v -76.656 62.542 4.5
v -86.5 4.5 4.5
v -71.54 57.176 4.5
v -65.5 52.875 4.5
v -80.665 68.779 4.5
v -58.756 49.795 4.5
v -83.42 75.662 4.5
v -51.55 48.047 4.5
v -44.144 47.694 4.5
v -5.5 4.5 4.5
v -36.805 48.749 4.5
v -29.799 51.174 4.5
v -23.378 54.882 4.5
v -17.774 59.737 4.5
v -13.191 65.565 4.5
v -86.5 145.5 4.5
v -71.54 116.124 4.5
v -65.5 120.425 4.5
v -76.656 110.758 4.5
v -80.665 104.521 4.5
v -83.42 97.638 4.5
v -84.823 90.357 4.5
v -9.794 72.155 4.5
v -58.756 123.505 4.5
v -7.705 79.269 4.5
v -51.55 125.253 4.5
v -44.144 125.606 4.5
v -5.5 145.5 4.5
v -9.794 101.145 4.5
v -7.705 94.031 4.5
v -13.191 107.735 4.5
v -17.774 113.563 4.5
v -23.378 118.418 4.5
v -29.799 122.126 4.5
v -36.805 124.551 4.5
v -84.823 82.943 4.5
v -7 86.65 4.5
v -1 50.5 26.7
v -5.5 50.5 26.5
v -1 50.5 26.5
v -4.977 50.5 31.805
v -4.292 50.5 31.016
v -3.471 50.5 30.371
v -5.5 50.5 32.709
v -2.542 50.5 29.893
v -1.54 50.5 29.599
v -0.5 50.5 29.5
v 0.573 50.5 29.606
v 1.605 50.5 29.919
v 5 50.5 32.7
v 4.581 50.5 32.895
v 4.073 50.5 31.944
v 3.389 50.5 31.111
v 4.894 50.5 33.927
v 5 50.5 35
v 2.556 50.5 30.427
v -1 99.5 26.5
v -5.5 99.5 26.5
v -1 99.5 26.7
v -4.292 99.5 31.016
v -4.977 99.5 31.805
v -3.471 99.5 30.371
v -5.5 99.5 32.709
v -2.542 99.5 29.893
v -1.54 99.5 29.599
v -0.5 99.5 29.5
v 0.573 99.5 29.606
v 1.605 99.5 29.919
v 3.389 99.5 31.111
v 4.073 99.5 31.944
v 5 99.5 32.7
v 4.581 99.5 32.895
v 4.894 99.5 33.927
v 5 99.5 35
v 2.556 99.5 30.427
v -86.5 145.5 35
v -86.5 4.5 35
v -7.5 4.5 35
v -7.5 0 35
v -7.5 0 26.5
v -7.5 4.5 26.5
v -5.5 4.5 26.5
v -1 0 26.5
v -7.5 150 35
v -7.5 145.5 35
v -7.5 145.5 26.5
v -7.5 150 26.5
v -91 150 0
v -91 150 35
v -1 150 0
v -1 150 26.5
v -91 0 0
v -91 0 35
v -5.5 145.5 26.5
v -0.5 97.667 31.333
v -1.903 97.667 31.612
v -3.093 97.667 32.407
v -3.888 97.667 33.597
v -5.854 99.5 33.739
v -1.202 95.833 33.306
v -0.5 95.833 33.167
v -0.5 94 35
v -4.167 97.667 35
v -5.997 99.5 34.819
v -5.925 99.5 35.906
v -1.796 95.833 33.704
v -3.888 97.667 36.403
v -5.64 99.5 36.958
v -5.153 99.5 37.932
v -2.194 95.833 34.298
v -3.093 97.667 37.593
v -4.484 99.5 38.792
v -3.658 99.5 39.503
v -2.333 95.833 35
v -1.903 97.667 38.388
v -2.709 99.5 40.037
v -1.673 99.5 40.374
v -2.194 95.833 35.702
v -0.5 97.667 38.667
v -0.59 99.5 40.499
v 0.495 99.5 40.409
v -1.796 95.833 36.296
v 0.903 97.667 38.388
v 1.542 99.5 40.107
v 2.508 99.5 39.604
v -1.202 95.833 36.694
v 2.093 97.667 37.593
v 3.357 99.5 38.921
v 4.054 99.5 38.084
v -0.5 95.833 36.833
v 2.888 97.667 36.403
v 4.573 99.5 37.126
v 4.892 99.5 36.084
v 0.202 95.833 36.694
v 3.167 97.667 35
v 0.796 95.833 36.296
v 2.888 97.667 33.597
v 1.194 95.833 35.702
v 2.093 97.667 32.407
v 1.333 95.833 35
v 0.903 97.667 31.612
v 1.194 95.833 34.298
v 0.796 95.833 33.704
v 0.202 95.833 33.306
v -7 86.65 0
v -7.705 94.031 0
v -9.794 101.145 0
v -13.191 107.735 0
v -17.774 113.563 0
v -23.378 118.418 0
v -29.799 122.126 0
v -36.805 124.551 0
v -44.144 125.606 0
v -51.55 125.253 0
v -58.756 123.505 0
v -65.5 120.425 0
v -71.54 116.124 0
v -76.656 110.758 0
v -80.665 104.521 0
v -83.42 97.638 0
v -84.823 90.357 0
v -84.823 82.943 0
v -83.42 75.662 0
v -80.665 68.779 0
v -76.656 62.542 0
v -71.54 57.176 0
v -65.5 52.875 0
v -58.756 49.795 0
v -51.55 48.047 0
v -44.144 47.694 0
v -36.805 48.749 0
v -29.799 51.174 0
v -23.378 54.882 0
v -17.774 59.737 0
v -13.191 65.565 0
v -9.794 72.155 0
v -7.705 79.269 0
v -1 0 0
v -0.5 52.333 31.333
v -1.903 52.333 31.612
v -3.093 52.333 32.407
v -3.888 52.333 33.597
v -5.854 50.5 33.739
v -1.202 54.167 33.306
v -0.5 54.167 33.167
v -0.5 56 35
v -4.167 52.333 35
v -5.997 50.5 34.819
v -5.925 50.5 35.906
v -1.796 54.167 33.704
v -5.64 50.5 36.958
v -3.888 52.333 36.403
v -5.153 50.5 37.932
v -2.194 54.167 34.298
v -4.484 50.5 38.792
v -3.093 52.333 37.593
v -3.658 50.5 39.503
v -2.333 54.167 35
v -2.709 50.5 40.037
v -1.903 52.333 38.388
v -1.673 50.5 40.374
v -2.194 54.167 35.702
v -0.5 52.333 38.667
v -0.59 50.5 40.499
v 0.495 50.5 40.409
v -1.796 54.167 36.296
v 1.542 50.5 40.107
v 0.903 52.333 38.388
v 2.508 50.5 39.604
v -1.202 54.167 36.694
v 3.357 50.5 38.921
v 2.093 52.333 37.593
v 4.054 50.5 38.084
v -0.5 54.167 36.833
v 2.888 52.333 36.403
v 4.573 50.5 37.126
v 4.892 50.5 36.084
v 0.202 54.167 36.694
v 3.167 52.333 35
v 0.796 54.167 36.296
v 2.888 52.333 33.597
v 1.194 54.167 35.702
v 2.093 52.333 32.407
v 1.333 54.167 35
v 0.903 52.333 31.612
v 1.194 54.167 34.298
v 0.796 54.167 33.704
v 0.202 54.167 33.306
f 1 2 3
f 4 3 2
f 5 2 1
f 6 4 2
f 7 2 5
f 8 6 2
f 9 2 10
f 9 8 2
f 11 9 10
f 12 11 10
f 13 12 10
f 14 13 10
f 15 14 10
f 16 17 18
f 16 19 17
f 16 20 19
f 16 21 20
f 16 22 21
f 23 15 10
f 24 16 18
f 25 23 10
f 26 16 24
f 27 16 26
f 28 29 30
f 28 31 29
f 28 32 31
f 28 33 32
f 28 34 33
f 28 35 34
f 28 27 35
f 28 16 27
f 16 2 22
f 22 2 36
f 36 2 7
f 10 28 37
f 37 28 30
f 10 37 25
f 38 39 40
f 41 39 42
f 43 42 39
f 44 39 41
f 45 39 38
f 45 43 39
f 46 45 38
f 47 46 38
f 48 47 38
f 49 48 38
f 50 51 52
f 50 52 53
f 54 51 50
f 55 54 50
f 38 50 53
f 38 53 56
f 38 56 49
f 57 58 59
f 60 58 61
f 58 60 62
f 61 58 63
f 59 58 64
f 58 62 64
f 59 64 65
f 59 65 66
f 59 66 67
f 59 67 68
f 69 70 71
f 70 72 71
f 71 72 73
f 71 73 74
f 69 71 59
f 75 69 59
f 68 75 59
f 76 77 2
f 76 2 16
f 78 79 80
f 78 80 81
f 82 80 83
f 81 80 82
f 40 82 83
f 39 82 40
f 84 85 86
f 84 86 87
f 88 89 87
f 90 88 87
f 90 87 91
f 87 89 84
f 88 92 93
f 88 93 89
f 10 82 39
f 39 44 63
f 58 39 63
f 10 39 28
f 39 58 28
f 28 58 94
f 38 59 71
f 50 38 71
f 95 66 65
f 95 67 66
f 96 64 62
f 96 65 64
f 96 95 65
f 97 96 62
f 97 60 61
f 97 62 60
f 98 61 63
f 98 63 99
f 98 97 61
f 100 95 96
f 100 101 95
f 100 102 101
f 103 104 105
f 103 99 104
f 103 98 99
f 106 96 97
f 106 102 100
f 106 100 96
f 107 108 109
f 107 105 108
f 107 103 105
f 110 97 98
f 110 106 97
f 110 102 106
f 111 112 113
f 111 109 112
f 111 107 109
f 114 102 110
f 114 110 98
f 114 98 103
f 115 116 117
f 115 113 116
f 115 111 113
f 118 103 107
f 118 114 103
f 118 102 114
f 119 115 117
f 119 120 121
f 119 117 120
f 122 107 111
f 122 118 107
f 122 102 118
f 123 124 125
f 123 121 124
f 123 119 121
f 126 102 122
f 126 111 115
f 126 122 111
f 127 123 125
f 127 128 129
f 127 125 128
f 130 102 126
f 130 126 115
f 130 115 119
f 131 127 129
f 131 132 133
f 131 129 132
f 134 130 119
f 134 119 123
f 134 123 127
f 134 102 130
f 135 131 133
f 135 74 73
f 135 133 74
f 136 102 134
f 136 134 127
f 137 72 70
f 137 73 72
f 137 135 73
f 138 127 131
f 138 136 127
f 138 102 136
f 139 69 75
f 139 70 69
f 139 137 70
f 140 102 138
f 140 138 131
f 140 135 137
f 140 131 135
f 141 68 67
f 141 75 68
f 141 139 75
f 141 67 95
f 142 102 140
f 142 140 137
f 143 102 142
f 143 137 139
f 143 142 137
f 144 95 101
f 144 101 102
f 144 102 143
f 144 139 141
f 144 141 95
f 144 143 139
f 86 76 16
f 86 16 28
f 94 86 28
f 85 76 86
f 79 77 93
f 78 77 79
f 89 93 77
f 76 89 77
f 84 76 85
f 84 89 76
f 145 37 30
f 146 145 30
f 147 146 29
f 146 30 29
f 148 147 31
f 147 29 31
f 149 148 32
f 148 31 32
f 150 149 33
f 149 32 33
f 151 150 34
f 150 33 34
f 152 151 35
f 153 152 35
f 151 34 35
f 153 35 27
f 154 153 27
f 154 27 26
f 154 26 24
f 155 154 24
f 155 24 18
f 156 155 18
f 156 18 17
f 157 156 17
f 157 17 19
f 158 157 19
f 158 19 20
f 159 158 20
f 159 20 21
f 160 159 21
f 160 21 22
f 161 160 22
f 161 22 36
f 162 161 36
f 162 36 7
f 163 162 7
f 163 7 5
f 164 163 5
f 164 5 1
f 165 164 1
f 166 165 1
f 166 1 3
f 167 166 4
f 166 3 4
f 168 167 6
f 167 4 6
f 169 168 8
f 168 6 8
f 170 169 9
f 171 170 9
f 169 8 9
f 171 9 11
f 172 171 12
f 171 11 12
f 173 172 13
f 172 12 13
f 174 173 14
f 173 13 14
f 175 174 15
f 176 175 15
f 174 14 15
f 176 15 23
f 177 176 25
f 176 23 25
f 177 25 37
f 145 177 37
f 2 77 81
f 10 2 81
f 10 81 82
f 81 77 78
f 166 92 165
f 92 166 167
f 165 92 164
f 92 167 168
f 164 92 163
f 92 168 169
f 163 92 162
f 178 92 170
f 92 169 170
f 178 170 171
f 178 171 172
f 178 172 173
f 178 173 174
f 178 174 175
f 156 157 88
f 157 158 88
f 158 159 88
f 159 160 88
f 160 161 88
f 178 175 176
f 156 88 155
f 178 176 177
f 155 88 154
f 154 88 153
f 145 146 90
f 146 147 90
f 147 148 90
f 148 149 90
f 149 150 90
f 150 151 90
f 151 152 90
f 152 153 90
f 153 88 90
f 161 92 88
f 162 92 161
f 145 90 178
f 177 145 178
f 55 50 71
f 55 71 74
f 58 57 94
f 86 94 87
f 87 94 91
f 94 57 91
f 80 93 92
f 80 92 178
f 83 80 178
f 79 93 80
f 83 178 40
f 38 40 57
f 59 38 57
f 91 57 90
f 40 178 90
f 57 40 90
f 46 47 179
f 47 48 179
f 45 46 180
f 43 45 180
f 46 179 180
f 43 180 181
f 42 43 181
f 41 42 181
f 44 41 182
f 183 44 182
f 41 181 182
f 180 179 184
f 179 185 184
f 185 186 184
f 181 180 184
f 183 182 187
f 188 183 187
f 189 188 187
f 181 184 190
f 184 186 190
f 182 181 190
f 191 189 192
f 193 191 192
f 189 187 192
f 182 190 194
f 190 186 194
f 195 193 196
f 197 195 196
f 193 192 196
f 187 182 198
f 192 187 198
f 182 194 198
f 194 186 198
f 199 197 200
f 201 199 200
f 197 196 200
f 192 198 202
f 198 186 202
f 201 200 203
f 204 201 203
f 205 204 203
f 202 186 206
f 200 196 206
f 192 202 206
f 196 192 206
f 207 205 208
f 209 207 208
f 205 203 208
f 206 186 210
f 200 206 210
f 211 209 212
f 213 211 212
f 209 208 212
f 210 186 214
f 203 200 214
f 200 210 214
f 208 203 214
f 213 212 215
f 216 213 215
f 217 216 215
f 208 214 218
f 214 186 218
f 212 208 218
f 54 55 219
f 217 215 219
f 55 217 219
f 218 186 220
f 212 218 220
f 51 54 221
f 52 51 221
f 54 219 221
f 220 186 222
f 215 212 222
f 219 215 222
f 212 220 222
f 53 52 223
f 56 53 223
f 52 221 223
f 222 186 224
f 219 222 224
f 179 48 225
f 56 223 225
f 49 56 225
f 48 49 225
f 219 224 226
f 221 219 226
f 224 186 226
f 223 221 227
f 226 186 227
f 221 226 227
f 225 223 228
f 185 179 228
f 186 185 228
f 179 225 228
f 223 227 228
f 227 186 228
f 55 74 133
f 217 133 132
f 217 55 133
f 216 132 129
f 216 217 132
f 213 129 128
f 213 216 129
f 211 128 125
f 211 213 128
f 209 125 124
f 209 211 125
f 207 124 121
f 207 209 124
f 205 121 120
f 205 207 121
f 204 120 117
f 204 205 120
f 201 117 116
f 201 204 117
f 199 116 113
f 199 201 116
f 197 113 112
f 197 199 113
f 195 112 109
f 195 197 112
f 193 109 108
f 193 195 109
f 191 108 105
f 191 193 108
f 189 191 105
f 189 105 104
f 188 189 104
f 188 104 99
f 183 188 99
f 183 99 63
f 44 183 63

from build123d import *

# Parameters (mm, degrees)
SKETCH010_W     = 90
SKETCH010_H     = 150
PAD004_DEPTH    = 35
SKETCH011_W     = 81
SKETCH011_H     = 141
POCKET004_DEPTH = 30.5
SKETCH012_R     = 5.5
PAD005_DEPTH    = 150
SKETCH015_W     = 50.5
SKETCH015_H     = 14
POCKET006_DEPTH = 7.5
PAD007_DEPTH    = 49
SKETCH024_R     = 39
POCKET009_DEPTH = 5


with BuildPart() as part:
    # Sketch010 → Pad004 (new body)
    with BuildSketch(Plane.XY):
        with Locations((-46, 75)):
            Rectangle(SKETCH010_W, SKETCH010_H)
    extrude(amount=PAD004_DEPTH)

    # Sketch011 (on Face6 of Pad004) → Pocket004 (cut)
    with BuildSketch(Plane.XY.offset(35)):
        with Locations((-46, 75)):
            Rectangle(SKETCH011_W, SKETCH011_H)
    extrude(amount=-POCKET004_DEPTH, mode=Mode.SUBTRACT)

    # Sketch012 → Pad005 (join)
    with BuildSketch(Plane.XZ):
        with Locations((-0.5, 35)):
            Circle(SKETCH012_R)
    extrude(amount=-PAD005_DEPTH)

    # Sketch015 → Pocket006 (cut, symmetric)
    with BuildSketch(Plane.YZ):
        with Locations((25.25, 33.5)):
            Rectangle(SKETCH015_W, SKETCH015_H)
        with Locations((124.75, 33.5)):
            Rectangle(SKETCH015_W, SKETCH015_H)
    extrude(amount=POCKET006_DEPTH, both=True, mode=Mode.SUBTRACT)

    # Sketch016 (on Face13 of Pocket006) → Pad007 (join)
    with BuildSketch(Plane.XZ.offset(-50.5)):
        Polygon((-1, 26.7), (5, 32.7), (5, 35), (-1, 35), align=None)
    extrude(amount=-PAD007_DEPTH)

    # Sketch020 (on DatumPlane) → Groove (revolve, cut)
    with BuildSketch(Plane(origin=(-0.5, 99.5, 0), x_dir=(0, -1, 0), z_dir=(-1, 0, 0))):
        Polygon((-1, 28.5), (5.5, 35), (-1, 35), align=None)
        Polygon((50, 28.5), (43.5, 35), (50, 35), align=None)
    revolve(axis=Axis((-0.5, 94, 35), (0, 1, 0)), mode=Mode.SUBTRACT)

    # Sketch024 (on Face18 of Groove) → Pocket009 (cut)
    with BuildSketch(Plane.XY.offset(4.5)):
        with Locations((-46, 86.65)):
            Circle(SKETCH024_R)
    extrude(amount=-POCKET009_DEPTH, mode=Mode.SUBTRACT)


solid = part.part
